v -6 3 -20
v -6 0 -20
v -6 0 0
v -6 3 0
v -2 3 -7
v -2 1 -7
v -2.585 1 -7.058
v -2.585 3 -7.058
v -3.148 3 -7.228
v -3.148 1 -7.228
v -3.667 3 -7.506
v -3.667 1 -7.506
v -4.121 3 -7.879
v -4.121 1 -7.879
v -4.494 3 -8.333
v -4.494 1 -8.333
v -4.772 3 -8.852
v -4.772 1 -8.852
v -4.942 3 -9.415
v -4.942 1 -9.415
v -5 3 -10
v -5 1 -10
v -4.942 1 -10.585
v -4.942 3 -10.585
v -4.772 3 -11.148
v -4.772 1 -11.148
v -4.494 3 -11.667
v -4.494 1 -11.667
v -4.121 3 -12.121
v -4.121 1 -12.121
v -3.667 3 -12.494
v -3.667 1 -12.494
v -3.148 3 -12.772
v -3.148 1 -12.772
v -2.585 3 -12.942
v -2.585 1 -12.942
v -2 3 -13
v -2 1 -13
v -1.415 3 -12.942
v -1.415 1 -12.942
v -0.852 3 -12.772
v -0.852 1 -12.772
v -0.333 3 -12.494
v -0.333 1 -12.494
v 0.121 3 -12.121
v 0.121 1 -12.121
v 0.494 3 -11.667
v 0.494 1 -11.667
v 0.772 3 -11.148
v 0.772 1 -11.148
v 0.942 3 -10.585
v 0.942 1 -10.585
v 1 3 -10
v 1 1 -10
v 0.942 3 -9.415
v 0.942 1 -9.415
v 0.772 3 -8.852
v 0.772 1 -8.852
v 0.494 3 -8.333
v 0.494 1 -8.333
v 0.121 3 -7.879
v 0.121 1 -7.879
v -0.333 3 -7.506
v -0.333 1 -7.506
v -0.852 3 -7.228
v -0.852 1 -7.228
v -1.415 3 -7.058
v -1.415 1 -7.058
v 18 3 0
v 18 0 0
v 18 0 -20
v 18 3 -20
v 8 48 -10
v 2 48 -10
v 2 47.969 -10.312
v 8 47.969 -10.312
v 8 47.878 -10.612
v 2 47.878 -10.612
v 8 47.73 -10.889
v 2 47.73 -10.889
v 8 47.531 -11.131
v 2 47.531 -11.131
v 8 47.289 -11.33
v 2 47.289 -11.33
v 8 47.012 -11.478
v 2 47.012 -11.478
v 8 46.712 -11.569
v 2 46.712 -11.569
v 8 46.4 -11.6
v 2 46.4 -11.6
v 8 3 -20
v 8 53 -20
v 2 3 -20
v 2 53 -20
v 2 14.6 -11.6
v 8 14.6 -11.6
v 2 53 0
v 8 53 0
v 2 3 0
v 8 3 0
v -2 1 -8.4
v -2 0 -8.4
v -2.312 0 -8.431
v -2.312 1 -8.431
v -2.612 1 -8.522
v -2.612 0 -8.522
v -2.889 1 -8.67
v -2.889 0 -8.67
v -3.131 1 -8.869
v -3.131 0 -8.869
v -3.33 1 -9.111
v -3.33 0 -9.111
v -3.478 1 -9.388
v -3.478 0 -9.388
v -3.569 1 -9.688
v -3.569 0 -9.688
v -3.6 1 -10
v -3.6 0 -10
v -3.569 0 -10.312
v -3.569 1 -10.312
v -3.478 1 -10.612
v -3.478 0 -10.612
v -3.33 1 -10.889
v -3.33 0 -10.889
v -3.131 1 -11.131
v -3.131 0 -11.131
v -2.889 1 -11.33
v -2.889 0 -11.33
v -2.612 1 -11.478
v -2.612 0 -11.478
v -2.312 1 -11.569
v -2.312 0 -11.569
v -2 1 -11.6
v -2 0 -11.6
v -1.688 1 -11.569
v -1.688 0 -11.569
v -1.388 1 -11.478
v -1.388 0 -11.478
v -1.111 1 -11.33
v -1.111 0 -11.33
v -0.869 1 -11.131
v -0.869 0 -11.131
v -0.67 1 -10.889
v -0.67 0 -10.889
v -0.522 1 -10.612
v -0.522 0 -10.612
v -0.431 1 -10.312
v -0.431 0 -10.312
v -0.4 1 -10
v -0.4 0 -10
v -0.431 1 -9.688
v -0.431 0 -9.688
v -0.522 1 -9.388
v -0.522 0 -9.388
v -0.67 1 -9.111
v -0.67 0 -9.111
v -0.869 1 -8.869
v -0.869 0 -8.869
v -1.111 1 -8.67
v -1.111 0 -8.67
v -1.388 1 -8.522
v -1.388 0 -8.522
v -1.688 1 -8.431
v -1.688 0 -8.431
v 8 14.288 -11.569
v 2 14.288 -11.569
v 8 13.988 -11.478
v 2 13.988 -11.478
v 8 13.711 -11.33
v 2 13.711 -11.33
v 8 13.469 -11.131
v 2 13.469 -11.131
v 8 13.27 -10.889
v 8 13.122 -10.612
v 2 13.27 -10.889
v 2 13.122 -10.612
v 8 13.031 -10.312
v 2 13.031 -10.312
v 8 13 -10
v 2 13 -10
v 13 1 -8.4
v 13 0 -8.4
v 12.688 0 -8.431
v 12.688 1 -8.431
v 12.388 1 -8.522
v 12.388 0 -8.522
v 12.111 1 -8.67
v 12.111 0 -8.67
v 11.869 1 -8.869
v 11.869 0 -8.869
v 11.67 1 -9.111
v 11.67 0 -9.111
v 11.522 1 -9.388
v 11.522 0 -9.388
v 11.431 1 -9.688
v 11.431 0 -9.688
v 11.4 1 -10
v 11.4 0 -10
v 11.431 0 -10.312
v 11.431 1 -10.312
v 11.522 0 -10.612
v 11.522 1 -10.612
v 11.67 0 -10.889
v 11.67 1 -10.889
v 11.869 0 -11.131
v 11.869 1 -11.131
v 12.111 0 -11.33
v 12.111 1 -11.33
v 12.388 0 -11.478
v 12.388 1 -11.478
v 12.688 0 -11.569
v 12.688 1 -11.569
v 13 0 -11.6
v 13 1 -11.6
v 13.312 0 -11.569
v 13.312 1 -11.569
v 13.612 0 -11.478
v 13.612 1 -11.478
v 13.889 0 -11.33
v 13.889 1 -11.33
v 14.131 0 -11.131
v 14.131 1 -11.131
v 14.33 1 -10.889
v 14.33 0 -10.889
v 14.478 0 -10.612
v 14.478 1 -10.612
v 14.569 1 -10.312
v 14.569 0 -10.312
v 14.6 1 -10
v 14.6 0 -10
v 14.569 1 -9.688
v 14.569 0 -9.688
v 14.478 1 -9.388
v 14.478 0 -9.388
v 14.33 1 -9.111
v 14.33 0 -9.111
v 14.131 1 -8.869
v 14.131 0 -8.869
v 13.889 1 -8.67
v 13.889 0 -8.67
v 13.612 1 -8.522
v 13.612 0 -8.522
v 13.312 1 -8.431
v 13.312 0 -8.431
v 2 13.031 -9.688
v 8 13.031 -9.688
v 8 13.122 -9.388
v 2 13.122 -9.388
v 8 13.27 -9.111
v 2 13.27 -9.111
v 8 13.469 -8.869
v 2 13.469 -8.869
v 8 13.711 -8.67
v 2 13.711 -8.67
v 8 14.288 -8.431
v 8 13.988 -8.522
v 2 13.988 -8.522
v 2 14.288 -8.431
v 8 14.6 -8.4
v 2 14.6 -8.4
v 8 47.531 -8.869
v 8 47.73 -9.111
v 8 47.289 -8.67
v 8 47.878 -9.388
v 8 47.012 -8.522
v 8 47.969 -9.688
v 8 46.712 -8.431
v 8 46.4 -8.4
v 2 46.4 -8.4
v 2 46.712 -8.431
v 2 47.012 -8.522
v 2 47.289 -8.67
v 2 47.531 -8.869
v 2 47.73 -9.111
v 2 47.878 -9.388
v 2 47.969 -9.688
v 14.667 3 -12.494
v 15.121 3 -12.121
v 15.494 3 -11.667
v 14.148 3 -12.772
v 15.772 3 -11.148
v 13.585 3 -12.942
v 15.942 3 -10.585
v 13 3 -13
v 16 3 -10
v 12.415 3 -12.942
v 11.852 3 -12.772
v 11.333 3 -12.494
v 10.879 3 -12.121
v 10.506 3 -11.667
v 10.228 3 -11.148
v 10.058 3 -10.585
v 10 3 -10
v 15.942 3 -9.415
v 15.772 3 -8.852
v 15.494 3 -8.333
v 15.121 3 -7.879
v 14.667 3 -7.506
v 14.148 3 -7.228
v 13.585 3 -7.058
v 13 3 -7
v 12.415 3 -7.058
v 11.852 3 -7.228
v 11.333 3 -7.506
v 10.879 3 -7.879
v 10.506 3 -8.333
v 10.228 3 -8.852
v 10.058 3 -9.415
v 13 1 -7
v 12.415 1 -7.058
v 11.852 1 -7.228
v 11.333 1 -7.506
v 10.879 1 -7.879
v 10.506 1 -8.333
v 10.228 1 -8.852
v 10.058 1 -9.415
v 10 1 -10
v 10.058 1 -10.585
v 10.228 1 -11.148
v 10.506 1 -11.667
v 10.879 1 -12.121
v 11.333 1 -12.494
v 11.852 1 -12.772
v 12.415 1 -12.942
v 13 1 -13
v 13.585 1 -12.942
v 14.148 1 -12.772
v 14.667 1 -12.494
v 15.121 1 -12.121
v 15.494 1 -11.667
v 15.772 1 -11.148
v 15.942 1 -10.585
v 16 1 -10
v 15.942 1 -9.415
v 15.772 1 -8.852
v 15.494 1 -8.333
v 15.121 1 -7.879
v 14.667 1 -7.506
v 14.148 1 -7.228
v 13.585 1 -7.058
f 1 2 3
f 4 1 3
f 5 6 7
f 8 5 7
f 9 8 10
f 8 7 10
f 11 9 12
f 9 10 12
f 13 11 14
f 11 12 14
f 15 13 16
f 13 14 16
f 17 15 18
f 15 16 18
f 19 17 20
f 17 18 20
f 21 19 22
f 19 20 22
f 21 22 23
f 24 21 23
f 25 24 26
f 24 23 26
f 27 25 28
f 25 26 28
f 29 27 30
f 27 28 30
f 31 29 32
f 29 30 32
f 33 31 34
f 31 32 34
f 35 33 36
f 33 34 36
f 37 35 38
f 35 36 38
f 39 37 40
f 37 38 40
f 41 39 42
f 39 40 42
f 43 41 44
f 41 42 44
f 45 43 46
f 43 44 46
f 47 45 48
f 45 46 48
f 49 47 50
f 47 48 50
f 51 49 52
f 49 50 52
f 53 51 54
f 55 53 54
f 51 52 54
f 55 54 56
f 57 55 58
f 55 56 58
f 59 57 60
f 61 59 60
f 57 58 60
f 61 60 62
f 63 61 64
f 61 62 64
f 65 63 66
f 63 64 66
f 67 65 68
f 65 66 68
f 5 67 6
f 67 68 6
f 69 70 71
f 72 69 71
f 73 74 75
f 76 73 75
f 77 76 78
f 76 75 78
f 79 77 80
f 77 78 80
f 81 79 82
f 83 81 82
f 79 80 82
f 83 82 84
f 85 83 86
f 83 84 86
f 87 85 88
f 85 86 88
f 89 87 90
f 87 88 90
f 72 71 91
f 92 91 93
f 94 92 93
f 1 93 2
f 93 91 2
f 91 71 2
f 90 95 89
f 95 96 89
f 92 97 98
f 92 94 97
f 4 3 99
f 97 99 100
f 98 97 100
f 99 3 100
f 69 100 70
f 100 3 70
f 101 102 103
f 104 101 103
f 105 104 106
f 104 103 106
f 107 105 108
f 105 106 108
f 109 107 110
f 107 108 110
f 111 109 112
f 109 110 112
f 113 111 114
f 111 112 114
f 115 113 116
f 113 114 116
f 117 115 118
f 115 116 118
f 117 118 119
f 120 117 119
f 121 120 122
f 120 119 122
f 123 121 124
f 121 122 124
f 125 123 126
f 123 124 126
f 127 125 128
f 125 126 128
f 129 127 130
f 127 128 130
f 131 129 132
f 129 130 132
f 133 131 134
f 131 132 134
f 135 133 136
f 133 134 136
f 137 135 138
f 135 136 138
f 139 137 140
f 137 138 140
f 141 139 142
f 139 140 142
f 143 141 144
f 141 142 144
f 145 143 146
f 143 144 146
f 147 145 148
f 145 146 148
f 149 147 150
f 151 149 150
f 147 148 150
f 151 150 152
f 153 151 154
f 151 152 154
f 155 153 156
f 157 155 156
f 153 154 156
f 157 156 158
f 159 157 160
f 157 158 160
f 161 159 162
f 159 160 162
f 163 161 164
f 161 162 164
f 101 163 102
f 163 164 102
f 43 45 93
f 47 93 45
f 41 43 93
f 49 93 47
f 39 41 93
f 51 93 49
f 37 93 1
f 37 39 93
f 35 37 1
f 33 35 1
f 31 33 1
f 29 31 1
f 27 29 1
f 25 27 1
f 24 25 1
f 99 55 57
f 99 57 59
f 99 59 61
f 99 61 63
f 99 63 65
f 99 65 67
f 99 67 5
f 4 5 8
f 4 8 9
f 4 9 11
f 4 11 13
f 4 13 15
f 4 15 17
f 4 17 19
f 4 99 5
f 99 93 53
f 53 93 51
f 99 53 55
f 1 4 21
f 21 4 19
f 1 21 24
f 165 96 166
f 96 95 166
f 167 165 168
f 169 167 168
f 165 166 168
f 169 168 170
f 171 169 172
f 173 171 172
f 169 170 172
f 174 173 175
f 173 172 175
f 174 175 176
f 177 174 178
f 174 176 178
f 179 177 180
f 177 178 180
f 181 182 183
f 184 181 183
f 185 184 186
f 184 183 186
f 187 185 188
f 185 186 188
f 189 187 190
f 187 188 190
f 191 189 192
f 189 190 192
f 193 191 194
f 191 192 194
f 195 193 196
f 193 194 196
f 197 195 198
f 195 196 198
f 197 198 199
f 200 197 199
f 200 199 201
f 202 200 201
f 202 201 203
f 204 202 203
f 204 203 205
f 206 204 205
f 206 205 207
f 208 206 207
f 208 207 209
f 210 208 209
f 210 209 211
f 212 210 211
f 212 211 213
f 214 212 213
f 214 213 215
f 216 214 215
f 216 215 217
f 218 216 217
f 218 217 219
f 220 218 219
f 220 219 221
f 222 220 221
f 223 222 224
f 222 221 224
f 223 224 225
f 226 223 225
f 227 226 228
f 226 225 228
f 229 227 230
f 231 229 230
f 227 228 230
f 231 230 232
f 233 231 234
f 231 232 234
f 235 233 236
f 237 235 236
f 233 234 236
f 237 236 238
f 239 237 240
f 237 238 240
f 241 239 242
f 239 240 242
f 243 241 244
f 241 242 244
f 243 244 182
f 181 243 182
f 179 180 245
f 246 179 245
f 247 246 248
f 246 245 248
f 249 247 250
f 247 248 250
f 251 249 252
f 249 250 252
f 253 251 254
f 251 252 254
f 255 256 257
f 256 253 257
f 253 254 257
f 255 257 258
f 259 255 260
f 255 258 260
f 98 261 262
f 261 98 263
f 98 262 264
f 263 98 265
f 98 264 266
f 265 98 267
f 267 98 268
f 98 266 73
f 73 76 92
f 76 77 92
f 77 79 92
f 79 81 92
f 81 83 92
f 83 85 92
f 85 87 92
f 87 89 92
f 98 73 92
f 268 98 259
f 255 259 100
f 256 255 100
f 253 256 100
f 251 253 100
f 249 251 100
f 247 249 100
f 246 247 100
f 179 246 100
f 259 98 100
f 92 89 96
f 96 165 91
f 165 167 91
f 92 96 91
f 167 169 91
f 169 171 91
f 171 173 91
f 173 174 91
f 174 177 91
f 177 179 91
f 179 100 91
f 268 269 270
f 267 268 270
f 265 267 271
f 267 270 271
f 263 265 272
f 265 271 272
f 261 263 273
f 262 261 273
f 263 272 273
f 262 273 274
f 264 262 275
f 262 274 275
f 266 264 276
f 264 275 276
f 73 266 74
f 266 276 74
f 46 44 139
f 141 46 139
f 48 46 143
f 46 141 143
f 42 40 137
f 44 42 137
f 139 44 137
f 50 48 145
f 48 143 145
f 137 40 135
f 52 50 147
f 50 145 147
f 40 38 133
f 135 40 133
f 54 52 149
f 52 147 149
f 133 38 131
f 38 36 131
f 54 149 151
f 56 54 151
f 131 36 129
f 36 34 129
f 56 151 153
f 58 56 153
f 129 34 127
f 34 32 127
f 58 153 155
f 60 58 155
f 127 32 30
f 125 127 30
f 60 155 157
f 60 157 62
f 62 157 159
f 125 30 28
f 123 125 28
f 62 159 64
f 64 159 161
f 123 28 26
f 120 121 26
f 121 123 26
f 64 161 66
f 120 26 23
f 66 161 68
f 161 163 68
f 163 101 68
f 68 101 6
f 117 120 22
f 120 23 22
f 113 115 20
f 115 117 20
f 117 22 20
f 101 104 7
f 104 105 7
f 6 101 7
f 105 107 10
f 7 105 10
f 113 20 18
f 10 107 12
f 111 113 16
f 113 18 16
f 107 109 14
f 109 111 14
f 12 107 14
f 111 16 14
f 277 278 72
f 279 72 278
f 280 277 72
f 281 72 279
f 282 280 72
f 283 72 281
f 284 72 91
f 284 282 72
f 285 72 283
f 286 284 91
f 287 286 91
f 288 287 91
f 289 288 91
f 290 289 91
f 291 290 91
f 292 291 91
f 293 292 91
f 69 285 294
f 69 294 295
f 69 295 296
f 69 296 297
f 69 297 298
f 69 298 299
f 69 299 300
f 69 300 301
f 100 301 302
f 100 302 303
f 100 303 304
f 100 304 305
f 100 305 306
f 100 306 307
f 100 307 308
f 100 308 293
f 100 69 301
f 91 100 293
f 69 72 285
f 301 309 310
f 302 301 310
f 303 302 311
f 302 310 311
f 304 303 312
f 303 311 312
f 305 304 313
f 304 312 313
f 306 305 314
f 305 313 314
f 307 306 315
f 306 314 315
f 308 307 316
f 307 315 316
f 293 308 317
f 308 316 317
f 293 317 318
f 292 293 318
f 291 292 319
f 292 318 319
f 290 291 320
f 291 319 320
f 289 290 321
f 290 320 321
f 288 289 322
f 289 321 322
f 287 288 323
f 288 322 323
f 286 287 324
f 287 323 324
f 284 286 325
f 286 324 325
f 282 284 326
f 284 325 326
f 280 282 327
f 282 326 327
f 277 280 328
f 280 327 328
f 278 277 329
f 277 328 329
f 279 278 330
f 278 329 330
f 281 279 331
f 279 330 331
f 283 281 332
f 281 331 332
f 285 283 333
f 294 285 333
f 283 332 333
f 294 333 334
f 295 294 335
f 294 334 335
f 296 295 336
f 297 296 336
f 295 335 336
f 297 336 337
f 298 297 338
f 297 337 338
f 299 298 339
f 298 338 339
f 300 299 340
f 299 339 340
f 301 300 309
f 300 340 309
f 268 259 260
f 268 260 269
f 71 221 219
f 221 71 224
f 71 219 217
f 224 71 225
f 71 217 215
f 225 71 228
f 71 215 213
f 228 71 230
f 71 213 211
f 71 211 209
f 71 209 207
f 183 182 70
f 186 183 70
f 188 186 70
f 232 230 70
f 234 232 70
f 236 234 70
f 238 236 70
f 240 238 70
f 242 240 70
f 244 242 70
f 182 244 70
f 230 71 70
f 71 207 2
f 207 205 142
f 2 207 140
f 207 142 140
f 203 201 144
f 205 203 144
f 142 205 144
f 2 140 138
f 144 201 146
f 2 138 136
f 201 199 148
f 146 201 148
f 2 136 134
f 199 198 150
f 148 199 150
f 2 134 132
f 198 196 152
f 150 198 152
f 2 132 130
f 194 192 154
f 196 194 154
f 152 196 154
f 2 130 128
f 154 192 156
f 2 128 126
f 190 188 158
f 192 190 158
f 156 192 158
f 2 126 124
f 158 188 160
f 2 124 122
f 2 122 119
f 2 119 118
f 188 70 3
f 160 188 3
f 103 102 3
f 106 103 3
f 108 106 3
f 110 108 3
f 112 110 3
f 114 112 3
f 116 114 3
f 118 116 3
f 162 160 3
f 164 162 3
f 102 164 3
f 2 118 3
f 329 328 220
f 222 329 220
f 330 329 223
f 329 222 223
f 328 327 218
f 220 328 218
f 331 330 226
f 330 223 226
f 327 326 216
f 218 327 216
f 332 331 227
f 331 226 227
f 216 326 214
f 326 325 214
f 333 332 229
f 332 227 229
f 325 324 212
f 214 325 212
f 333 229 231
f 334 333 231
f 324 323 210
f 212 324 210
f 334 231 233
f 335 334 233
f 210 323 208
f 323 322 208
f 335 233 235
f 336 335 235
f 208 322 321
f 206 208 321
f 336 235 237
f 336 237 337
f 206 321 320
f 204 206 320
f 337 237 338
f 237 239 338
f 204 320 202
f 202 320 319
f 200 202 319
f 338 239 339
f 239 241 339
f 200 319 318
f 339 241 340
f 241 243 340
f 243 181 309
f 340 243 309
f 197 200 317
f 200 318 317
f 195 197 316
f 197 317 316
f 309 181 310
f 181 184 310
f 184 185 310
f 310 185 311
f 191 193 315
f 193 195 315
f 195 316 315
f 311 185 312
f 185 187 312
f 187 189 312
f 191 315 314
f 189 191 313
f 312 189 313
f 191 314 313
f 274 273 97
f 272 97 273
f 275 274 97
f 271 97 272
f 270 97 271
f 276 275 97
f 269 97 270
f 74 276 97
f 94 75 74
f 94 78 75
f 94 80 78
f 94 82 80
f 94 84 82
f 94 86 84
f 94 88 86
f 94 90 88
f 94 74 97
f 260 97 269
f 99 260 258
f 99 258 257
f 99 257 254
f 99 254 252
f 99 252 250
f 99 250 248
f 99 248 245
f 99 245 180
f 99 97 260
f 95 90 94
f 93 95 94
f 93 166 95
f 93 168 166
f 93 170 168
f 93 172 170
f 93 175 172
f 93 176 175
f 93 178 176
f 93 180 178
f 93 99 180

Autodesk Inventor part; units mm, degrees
ref_plane "YZ Plane" through (0, 0, 0) normal (1, 0, 0) x (0, 1, 0)
ref_plane "XZ Plane" through (0, 0, 0) normal (0, 1, 0) x (-1, 0, 0)
ref_plane "XY Plane" through (0, 0, 0) normal (0, 0, 1) x (1, 0, 0)
sketch "Boceto1" plane through (0, 0, 0) normal (0, 1, 0) x (-1, 0, 0)
  line L0 (0, 0) -> (-10, 0)
  line L1 (-10, -20) -> (0, -20)
  line L2 (-10, 0) -> (-8, 0)
  line L3 (-8, 0) -> (-14, 0)
  line L4 (-14, 0) -> (-18, 0)
  line L5 (-18, 0) -> (-18, -20)
  line L6 (-18, -20) -> (-10, -20)
  line L7 (0, -20) -> (-2, -20)
  line L8 (-2, -20) -> (6, -20)
  line L9 (6, -20) -> (6, 0)
  line L10 (6, 0) -> (0, 0)
  dimension "d8" = 4
  dimension "d9" = 8
extrude "Extrusión1" add sketch "Boceto1" along normal blind 3
sketch "Boceto2" plane through (0, 3, 0) normal (0, 1, 0) x (1, 0, 0)
  line L0 (5, 20) -> (2, 20)
  line L1 (2, 0) -> (2, 20)
  line L2 (5, 20) -> (8, 20)
  line L3 (8, 0) -> (8, 20)
  line L4 (2, 0) -> (8, 0)
extrude "Extrusión2" add sketch "Boceto2" along normal blind 50
sketch "Boceto4" plane through (0, 3, 0) normal (0, 1, 0) x (1, 0, 0)
  line L0 (-6, 0) -> (18, 0) projected
  line L1 (18, 0) -> (8, 0)
  line L2 (13, 0) -> (13, 20)
  point P0 (0, 0)
  point P1 (13, 10)
hole "Agujero2" at (13, 3, -10) direction (0, -1, 0) diameter 3.2 depth 15 counterbore diameter 6 counterbore depth 2
sketch "Boceto5" plane through (0, 3, 0) normal (0, 1, 0) x (1, 0, 0)
  line L0 (-6, 20) -> (-6, 0) projected
  line L1 (-6, 10) -> (2, 10)
  point P0 (0, 0)
  point P1 (-2, 10)
hole "Agujero3" at (-2, 3, -10) direction (0, -1, 0) diameter 3.2 depth 15 counterbore diameter 6 counterbore depth 2
sketch "Boceto6" plane through (8, 3, 0) normal (1, 0, 0) x (0, 0, -1)
  line L0 (10, 10) -> (11.6, 10)
  line L1 (10, 10) -> (8.4, 10)
  line L2 (8.4, 10) -> (8.4, 40)
  line L3 (11.6, 40) -> (11.6, 10)
  line L4 (11.6, 40) -> (11.6, 45)
  line L5 (11.6, 45) -> (8.4, 45)
  line L6 (8.4, 45) -> (8.4, 40)
  point P0 (0, -3)
extrude "Extrusión3" cut sketch "Boceto6" against normal blind 35.5
fillet "Empalme1" radius 1.6 4 edges at (5, 48, -11.6) (5, 48, -8.4) (5, 13, -8.4) (5, 13, -11.6)
properties part number "Ventilador tub - guies"
